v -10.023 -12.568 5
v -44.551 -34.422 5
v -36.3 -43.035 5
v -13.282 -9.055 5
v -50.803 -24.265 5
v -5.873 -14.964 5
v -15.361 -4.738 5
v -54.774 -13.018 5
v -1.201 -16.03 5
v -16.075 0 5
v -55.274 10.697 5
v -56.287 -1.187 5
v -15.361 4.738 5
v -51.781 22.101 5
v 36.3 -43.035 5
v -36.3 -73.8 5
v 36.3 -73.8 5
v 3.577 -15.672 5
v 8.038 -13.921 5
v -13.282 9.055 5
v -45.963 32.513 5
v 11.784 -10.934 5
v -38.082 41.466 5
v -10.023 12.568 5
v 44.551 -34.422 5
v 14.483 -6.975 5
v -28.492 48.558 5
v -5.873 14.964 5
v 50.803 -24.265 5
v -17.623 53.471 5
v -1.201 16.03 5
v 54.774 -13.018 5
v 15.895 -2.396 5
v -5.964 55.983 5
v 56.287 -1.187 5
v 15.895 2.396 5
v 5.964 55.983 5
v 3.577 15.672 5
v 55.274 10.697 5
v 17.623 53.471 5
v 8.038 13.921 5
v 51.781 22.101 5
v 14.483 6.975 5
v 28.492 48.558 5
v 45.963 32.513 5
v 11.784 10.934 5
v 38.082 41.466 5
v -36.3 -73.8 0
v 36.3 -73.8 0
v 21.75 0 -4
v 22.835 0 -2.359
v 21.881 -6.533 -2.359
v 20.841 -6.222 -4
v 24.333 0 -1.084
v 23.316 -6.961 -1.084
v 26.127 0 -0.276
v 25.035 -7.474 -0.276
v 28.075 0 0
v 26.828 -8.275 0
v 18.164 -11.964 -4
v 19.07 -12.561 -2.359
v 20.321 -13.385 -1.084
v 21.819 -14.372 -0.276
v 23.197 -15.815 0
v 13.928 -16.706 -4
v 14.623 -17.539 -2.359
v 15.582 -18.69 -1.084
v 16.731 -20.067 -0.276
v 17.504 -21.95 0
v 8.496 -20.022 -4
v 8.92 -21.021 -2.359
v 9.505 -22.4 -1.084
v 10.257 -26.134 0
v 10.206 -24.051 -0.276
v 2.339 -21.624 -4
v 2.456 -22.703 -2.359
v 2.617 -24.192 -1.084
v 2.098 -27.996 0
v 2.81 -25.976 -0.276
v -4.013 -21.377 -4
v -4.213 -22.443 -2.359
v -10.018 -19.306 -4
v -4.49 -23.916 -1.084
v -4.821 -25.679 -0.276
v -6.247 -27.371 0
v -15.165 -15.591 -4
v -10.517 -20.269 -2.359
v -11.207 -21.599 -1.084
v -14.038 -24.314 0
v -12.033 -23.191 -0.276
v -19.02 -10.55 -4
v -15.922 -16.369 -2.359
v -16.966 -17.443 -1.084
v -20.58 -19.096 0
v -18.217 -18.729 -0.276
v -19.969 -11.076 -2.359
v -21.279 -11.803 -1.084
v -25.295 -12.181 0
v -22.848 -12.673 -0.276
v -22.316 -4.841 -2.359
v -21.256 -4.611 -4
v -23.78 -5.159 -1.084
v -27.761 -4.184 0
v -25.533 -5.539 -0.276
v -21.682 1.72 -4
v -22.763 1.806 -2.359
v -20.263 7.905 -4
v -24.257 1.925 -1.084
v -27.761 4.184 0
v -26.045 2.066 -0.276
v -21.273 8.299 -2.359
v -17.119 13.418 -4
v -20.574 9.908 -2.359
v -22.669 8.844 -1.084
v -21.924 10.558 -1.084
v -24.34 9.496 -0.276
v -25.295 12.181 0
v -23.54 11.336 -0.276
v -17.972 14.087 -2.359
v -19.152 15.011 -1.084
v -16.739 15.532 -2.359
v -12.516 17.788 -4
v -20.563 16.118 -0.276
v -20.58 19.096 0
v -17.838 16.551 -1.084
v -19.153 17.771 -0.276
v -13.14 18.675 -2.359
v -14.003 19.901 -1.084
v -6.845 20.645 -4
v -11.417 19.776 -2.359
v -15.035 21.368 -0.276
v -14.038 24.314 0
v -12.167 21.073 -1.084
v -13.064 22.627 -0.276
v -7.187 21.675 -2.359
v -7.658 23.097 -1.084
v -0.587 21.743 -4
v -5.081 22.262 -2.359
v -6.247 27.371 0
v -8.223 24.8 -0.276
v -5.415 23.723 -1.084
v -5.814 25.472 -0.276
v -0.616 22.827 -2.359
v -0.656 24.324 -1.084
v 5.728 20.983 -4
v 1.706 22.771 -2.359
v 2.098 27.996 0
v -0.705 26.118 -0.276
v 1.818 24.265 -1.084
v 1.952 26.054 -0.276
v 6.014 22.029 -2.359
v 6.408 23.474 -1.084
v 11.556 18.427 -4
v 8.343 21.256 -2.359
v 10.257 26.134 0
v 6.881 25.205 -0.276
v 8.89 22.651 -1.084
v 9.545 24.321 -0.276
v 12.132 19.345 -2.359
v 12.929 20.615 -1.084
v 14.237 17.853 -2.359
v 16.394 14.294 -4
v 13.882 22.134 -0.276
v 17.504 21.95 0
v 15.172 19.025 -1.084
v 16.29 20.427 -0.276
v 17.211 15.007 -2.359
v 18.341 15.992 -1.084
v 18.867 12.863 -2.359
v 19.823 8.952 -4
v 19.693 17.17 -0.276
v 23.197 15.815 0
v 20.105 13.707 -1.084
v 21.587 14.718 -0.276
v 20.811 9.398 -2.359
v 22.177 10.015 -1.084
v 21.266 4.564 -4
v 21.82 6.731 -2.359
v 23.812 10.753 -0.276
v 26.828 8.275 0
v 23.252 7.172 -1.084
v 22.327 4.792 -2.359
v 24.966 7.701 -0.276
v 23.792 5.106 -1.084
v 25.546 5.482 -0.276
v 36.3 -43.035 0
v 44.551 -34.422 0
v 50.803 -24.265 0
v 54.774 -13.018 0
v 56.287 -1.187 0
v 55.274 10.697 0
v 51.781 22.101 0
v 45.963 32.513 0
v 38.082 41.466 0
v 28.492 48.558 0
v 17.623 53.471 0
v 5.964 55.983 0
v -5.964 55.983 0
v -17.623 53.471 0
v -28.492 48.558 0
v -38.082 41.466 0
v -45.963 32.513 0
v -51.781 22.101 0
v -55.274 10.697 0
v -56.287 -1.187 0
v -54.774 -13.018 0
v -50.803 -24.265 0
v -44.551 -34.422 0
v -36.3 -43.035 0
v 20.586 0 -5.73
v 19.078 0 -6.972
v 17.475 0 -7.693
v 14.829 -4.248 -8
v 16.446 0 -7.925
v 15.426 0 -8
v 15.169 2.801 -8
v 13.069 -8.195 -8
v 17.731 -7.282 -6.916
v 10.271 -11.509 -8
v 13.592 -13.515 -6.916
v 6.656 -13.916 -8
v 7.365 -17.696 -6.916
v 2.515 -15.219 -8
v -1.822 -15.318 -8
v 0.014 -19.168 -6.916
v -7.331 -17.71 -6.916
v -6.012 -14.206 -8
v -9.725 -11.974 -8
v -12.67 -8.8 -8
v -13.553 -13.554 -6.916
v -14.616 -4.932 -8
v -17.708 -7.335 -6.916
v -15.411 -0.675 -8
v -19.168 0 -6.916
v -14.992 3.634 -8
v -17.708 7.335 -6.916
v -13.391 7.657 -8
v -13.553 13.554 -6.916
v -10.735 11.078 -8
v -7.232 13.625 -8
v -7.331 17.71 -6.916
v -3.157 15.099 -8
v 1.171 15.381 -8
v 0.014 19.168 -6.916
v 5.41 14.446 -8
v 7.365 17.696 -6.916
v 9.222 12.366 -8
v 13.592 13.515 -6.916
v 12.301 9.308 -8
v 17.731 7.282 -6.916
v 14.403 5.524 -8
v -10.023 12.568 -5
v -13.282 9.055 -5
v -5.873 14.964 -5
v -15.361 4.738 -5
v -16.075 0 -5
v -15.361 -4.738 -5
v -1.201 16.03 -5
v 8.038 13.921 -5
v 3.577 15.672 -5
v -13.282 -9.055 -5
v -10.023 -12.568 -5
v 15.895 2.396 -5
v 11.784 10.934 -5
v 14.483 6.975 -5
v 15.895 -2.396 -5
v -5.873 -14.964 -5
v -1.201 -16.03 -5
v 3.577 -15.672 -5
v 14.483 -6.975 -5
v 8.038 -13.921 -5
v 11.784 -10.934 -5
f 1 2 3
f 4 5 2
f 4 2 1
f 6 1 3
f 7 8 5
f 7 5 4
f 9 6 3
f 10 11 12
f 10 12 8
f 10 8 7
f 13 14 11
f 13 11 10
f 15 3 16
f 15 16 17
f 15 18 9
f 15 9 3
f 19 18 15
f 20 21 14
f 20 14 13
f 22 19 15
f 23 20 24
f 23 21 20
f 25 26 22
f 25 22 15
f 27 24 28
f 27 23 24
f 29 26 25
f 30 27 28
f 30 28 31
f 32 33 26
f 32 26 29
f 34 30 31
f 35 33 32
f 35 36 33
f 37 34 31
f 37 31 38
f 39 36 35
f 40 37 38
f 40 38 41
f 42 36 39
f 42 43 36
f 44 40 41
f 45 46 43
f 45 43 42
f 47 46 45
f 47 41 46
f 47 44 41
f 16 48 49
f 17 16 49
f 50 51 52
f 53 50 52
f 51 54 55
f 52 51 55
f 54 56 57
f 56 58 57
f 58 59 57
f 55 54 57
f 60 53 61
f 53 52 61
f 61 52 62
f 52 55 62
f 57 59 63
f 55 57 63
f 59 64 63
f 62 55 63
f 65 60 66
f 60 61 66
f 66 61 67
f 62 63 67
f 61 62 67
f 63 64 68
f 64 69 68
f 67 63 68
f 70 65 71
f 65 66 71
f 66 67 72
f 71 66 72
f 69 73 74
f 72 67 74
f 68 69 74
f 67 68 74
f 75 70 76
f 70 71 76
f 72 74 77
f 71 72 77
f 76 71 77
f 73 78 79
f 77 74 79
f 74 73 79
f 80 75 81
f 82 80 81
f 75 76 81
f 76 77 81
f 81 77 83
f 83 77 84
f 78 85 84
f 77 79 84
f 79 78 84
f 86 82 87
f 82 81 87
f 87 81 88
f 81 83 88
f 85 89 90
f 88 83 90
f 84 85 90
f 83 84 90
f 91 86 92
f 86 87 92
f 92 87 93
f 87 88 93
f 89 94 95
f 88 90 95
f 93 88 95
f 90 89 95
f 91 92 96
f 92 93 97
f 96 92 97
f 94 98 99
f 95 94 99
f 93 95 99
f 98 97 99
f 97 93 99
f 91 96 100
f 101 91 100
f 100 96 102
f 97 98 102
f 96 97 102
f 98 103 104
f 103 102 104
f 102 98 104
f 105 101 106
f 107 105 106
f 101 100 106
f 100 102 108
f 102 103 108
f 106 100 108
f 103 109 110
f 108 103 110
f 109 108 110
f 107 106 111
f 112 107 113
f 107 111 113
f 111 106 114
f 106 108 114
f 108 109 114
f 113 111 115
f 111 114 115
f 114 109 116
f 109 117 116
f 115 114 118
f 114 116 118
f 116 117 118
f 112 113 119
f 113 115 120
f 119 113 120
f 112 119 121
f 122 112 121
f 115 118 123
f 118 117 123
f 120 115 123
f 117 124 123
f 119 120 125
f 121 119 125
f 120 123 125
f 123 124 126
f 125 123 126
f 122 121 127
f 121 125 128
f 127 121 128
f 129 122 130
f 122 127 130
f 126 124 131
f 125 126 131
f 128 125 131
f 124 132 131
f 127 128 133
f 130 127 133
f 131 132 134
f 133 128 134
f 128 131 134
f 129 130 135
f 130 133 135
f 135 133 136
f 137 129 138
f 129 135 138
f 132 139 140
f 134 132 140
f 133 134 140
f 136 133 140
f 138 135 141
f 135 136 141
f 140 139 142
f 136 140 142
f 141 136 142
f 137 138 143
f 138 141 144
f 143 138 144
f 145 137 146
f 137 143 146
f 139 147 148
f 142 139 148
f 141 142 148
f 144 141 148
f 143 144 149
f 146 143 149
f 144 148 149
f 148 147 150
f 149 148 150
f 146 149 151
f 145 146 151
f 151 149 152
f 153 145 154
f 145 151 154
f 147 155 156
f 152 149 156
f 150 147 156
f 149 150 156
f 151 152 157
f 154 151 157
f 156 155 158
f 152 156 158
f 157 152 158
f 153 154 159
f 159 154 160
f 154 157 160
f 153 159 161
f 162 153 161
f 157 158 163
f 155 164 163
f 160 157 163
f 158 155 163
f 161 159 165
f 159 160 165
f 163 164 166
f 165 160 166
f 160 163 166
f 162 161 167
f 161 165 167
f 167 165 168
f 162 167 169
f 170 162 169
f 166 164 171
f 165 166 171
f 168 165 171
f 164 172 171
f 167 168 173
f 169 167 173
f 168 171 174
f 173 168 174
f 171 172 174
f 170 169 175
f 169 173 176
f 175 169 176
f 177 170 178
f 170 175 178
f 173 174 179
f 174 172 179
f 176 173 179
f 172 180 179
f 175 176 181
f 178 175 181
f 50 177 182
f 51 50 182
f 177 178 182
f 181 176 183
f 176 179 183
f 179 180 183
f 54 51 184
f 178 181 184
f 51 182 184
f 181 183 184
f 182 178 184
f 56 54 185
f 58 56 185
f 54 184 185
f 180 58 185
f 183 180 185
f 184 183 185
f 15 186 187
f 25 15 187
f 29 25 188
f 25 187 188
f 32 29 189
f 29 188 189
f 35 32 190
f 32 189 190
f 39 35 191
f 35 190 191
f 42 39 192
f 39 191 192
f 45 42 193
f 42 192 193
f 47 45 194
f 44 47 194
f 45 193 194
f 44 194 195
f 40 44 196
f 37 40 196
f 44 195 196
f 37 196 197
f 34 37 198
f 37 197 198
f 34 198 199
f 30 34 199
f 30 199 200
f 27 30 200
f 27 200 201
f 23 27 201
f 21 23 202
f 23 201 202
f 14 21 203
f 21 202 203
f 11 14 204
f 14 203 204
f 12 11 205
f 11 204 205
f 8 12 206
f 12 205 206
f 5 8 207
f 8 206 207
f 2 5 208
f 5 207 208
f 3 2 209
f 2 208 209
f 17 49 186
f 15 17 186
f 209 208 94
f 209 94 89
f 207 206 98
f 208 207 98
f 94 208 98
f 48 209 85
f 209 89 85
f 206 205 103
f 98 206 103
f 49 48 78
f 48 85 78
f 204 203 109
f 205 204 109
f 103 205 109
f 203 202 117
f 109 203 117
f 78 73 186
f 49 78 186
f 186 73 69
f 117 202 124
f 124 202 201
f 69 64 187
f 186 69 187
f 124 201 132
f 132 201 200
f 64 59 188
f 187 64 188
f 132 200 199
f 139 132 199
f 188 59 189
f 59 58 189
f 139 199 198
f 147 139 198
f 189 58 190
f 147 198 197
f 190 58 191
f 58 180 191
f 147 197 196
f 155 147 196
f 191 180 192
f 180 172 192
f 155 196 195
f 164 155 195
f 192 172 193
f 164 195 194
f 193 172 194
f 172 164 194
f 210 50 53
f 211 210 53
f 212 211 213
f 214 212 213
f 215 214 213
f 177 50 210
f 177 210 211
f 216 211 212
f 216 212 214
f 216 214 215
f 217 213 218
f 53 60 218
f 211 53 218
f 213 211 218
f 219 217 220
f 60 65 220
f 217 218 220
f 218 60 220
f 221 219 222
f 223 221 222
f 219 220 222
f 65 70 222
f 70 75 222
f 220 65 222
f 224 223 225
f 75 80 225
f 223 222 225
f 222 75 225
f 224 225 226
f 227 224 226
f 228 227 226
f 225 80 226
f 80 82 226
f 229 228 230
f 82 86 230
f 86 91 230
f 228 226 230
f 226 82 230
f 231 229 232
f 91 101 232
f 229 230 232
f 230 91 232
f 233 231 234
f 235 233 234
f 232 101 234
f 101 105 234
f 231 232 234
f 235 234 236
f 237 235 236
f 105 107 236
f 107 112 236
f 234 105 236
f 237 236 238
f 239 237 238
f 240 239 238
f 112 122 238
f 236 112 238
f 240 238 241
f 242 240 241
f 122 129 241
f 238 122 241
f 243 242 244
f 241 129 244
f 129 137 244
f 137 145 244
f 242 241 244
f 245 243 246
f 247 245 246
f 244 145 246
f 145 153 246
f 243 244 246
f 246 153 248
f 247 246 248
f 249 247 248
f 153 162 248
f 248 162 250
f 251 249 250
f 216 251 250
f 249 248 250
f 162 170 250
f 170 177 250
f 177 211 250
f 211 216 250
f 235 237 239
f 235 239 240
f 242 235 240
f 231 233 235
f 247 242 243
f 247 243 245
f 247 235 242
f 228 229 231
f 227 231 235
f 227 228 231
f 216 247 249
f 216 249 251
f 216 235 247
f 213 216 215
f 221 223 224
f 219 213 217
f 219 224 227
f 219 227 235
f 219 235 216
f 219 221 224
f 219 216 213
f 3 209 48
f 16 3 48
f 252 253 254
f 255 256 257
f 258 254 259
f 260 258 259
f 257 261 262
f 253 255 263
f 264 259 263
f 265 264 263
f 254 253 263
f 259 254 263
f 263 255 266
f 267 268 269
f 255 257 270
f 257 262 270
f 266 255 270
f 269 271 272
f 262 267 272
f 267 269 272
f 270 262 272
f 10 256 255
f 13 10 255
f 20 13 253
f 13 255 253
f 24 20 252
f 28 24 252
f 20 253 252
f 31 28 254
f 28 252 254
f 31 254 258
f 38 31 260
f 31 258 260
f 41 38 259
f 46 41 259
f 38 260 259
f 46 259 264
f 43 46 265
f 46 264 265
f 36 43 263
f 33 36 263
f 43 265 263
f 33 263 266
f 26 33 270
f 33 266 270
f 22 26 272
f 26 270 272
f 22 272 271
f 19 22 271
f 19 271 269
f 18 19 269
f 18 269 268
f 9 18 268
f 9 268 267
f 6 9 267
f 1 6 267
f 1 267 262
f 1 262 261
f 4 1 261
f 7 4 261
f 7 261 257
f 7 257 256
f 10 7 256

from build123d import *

# Parameters (mm, degrees)
BOSS_EXTRUDE1_DEPTH = 5
SKETCH2_R           = 16.075
CUT_EXTRUDE1_DEPTH  = 33
BOSS_EXTRUDE2_START = 5
SKETCH3_R           = 21.075
SKETCH3_R_2         = 16.075
BOSS_EXTRUDE2_DEPTH = 5
BOSS_EXTRUDE3_START = 3
SKETCH4_R           = 21.075
BOSS_EXTRUDE3_DEPTH = 3
FILLET1_R           = 7
FILLET2_R           = 7


with BuildPart() as part:
    # Sketch1 → Boss-Extrude1 (new body)
    with BuildSketch(Plane.XY):
        with BuildLine():
            ThreePointArc((36.3, -43.034869583), (0, 56.3), (-36.3, -43.034869583))
            Line((-36.3, -43.034869583), (-36.3, -73.8))
            Line((-36.3, -73.8), (36.3, -73.8))
            Line((36.3, -73.8), (36.3, -43.034869583))
        make_face()
    extrude(amount=BOSS_EXTRUDE1_DEPTH)

    # Sketch2 → Cut-Extrude1 (cut)
    with BuildSketch(Plane(origin=(0, 0, 0), x_dir=(-1, 0, 0), z_dir=(0, 0, -1))):
        Circle(SKETCH2_R)
    extrude(amount=-CUT_EXTRUDE1_DEPTH, mode=Mode.SUBTRACT)

    # Sketch3 → Boss-Extrude2 (add)
    with BuildSketch(Plane(origin=(0, 0, 0), x_dir=(-1, 0, 0), z_dir=(0, 0, -1)).offset(BOSS_EXTRUDE2_START)):
        with Locations(Location((0, 0, 0), (0, 0, 180))):
            Circle(SKETCH3_R)
        Circle(SKETCH3_R_2, mode=Mode.SUBTRACT)
    extrude(amount=-BOSS_EXTRUDE2_DEPTH)

    # Sketch4 → Boss-Extrude3 (add)
    with BuildSketch(Plane(origin=(0, 0, -5), x_dir=(-1, 0, 0), z_dir=(0, 0, -1)).offset(BOSS_EXTRUDE3_START)):
        with Locations(Location((0, 0, 0), (0, 0, 180))):
            Circle(SKETCH4_R)
    extrude(amount=-BOSS_EXTRUDE3_DEPTH)

    # Fillet1
    fillet1_edges = [part.edges().sort_by_distance(p)[0] for p in [
        (-21.075, 0, 0),
    ]]
    fillet(fillet1_edges, radius=FILLET1_R)

    # Fillet2
    fillet2_edges = [part.edges().sort_by_distance(p)[0] for p in [
        (-21.075, 0, -8),
    ]]
    fillet(fillet2_edges, radius=FILLET2_R)


solid = part.part
